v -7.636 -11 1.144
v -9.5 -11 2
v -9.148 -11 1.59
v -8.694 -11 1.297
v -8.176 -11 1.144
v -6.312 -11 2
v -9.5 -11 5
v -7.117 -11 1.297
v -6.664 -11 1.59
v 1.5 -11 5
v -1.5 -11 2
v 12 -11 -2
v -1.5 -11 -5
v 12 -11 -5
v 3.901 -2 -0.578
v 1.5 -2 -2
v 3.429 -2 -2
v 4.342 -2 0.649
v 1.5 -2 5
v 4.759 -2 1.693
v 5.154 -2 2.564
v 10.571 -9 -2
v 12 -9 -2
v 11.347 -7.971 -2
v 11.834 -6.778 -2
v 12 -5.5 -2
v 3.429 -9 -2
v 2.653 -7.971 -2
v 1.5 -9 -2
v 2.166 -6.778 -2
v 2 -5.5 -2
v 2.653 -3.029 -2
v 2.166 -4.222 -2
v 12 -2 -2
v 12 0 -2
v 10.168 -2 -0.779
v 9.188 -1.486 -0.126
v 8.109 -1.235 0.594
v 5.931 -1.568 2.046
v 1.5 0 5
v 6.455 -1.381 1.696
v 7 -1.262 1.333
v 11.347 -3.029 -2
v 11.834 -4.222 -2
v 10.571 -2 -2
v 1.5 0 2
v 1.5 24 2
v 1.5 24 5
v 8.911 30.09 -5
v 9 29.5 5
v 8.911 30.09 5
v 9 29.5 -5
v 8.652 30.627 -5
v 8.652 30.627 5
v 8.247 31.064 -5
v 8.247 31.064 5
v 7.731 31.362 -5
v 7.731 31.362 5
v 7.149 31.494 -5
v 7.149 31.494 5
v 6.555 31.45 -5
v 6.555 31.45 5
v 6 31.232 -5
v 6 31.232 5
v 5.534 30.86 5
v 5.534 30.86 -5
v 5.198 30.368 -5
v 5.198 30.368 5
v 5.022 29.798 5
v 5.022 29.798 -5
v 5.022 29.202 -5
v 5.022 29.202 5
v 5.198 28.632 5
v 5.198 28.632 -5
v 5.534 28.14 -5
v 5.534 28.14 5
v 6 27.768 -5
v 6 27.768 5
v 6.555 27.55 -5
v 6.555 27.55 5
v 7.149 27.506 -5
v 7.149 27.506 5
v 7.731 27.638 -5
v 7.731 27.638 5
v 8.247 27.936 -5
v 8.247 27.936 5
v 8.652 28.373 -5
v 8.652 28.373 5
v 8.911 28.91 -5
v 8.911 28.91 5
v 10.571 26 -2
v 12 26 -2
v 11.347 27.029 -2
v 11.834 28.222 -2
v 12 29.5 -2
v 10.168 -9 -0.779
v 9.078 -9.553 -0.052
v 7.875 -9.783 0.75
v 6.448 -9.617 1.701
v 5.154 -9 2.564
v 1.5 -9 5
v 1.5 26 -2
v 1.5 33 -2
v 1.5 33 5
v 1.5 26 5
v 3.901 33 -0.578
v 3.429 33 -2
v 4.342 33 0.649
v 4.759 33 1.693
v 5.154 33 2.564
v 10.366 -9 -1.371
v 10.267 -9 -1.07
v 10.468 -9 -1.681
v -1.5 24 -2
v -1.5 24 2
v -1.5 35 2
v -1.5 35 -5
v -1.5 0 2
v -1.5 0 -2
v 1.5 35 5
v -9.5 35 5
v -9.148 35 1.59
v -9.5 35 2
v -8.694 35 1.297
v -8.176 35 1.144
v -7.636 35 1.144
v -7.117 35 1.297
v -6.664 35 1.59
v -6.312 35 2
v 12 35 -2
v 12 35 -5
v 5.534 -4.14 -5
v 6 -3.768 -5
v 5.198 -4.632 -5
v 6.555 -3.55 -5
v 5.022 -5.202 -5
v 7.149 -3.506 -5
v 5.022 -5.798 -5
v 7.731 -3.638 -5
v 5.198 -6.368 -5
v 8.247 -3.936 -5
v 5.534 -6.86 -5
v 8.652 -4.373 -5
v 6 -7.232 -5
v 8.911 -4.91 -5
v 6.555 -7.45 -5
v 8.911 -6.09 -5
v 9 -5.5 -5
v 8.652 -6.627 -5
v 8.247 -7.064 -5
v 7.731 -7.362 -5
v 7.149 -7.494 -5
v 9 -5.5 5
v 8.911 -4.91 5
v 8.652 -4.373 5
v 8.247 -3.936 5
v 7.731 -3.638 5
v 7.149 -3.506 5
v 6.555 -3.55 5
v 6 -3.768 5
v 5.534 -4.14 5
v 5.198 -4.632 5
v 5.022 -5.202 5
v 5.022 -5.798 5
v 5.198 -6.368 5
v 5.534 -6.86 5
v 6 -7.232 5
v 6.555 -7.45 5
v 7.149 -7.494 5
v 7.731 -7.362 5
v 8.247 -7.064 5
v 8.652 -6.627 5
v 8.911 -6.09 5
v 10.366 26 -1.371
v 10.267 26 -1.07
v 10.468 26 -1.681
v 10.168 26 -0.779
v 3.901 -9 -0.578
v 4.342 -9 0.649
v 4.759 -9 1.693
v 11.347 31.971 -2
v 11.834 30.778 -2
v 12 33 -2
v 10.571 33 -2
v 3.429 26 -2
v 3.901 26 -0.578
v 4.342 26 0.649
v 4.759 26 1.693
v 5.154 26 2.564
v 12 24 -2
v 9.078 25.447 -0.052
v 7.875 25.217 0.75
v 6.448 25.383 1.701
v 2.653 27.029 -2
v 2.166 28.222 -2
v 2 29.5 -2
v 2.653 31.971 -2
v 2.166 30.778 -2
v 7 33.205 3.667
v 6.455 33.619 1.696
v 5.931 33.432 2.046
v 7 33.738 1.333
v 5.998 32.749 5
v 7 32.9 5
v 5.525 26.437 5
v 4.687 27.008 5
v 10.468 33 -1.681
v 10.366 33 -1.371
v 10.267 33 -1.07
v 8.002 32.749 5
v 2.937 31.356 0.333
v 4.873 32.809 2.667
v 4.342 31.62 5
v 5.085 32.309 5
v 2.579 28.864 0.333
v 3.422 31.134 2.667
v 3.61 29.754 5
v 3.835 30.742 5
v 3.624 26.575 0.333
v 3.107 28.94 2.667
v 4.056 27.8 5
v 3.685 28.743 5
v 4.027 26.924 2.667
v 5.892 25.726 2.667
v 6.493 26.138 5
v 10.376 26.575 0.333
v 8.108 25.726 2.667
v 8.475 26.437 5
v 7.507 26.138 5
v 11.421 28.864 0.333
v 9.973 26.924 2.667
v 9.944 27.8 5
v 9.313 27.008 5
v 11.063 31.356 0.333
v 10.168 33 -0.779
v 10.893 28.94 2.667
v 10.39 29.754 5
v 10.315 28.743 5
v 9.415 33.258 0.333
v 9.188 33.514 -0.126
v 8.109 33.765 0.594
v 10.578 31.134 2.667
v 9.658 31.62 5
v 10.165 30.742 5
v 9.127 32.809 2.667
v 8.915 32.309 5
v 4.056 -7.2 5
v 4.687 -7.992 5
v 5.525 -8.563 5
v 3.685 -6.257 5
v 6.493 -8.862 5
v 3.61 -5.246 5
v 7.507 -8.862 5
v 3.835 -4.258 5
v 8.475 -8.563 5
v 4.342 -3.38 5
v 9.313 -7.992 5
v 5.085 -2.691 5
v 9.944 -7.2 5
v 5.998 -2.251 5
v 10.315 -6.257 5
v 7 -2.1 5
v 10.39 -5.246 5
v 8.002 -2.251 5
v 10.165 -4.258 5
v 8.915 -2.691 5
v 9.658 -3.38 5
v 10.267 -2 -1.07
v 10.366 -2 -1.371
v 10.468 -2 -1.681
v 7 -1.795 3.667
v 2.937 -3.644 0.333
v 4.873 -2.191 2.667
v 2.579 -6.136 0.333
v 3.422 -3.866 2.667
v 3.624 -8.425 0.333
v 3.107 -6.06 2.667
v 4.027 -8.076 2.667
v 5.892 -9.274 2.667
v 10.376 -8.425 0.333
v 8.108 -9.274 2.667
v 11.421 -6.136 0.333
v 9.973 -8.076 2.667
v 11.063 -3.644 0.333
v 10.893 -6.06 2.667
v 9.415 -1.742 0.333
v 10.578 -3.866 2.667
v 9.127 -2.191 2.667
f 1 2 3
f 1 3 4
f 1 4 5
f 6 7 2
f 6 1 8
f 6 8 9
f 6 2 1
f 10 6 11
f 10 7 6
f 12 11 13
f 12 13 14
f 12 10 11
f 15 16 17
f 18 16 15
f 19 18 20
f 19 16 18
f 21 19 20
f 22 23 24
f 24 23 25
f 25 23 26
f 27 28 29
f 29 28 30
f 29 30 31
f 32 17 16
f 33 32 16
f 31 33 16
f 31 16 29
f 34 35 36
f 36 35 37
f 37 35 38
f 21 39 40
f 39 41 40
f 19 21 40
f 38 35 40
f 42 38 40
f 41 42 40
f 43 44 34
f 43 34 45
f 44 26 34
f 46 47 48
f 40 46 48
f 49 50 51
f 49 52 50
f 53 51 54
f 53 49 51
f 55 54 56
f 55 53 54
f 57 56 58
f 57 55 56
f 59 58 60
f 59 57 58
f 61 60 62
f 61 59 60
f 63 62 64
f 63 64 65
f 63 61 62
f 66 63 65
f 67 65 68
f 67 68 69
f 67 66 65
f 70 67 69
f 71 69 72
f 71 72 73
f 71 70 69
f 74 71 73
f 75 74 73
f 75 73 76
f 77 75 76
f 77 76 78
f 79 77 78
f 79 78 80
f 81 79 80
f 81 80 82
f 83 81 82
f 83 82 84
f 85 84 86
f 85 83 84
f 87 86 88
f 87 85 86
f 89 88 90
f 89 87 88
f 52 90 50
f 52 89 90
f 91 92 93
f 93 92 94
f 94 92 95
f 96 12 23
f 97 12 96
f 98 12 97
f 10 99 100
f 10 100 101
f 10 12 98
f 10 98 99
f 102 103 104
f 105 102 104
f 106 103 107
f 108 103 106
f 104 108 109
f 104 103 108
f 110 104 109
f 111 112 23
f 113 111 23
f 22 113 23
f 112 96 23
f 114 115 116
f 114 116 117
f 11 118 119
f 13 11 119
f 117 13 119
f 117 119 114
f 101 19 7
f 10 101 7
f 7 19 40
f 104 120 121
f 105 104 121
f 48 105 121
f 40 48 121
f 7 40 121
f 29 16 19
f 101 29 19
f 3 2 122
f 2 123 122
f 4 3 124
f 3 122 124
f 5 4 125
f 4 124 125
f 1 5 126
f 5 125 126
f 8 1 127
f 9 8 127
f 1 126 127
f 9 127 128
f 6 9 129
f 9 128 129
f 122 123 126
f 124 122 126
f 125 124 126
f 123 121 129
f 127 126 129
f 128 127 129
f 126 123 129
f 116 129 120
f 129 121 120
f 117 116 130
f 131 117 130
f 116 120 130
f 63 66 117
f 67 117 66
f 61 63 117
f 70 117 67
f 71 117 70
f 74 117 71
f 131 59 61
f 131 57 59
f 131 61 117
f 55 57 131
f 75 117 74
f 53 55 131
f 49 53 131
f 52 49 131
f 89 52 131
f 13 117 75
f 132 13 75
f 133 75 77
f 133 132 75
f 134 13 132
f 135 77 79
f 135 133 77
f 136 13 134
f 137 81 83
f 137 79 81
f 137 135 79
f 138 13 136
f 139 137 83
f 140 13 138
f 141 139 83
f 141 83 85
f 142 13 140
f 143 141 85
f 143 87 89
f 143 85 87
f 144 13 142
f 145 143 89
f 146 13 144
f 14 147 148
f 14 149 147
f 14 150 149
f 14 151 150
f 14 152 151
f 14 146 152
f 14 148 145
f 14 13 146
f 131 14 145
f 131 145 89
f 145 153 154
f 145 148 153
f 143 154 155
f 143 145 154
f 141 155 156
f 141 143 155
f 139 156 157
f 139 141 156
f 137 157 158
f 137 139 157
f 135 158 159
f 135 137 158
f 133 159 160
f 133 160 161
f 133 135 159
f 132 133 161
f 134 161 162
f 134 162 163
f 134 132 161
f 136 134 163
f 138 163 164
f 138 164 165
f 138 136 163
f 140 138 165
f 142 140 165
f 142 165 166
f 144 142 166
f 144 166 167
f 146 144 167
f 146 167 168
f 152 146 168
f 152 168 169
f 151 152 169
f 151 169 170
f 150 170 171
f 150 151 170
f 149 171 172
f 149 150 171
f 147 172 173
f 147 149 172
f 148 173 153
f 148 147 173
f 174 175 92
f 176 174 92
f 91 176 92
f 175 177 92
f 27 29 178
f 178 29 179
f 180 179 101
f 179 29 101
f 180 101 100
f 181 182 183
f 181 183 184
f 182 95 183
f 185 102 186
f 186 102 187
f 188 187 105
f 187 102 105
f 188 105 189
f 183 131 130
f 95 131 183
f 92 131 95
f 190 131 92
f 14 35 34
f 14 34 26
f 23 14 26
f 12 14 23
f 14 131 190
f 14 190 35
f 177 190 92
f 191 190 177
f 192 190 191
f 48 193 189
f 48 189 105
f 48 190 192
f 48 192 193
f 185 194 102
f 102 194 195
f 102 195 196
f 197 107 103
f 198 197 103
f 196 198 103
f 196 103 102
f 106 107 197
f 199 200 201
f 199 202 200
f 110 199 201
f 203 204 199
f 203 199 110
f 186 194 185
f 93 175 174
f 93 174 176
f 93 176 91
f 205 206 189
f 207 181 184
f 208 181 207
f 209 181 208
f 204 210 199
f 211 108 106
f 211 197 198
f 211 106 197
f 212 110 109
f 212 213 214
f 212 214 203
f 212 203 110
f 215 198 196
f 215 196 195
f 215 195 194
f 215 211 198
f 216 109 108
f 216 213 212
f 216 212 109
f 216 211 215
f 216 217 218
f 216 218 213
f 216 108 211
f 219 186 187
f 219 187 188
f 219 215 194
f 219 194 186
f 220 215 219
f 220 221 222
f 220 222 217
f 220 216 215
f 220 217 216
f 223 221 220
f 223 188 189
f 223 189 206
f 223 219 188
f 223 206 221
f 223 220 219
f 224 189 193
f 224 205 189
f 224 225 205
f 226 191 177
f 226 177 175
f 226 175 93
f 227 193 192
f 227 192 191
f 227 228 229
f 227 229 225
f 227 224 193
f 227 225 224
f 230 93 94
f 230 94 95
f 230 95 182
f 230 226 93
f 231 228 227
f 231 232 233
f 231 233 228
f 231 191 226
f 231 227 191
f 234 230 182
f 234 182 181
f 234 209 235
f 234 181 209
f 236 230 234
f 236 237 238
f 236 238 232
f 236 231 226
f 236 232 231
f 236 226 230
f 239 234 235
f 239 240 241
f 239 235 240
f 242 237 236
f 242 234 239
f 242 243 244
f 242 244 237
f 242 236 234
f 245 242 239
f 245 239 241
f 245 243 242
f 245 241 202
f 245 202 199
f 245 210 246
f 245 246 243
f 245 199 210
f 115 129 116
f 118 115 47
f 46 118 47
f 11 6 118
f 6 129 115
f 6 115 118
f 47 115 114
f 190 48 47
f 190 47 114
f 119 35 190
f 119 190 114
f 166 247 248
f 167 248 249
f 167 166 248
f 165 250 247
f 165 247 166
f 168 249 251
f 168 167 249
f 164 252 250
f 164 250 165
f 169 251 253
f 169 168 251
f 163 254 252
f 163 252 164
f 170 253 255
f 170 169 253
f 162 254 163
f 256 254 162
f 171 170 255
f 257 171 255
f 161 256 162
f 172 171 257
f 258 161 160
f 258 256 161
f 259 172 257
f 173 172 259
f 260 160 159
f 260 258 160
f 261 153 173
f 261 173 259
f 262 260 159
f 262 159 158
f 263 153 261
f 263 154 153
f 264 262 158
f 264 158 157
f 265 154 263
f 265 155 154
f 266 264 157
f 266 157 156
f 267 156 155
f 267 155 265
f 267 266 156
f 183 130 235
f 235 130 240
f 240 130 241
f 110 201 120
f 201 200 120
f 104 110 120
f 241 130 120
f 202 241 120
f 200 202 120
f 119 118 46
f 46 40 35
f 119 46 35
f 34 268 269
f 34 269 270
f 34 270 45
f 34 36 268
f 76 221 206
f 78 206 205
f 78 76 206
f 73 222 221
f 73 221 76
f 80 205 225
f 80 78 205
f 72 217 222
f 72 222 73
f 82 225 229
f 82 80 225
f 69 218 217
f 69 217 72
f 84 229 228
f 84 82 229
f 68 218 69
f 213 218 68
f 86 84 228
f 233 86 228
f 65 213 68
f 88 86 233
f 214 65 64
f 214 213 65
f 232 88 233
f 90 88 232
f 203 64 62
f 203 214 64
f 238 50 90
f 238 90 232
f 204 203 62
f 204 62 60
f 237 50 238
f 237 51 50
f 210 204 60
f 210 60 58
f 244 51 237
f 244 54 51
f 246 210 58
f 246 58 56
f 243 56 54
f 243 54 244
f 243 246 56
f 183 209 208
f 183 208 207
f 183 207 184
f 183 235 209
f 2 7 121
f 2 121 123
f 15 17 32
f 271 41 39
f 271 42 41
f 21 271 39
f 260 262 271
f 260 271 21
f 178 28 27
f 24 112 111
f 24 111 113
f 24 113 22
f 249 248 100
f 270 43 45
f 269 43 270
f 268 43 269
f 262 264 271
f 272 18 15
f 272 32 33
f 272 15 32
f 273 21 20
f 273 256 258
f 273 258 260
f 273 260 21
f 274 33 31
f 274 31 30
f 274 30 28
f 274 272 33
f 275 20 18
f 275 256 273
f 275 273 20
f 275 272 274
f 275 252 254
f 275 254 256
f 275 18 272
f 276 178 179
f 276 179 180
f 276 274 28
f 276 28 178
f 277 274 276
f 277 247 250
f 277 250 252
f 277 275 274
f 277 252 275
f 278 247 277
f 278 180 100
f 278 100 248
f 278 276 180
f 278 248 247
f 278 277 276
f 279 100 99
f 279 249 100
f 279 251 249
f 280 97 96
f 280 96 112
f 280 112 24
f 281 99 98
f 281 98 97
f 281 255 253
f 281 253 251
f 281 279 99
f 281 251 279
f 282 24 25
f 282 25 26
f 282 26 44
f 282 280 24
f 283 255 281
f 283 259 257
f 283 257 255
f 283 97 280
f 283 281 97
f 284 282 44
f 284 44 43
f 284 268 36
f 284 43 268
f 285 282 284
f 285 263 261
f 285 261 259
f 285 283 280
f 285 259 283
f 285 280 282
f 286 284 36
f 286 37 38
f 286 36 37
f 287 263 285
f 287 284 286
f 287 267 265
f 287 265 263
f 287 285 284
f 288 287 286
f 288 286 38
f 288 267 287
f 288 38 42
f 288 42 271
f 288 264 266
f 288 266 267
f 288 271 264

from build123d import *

# Parameters (mm, degrees)
F0_W      = 3
F0_H      = 4
F1_DEPTH  = 11
F2_DEPTH  = 2
F4_DEPTH  = 2
F5_R      = 2
F6_DEPTH  = 25
F7_R      = 3.4
F7_R_2    = 2
F8_DEPTH  = 7
F13_DEPTH = 24


with BuildPart() as f1:
    # F0 (on Front) → F1 (new body)
    with BuildSketch(Plane.XZ):
        Polygon((12, -5), (12, -2), (1.5, -2), (-1.5, -2), (-1.5, -4), (-1.5, -5), (1.5, -5), align=None)
        with BuildLine():
            Line((1.5, 4), (1.5, 5))
            Line((1.5, 5), (-9.5, 5))
            Line((-9.5, 5), (-9.5, 2))
            ThreePointArc((-9.5, 2), (-7.9057595357, 1.1241546177), (-6.3115190715, 2))
            Line((-6.3115190715, 2), (-1.5, 2))
            Line((-1.5, 2), (1.5, 2))
            Line((1.5, 2), (1.5, 4))
        make_face()
        Rectangle(F0_W, F0_H)
    extrude(amount=F1_DEPTH)

    # F0 (on Front) → F2 (join)
    with BuildSketch(Plane.XZ):
        Polygon((12, -2), (1.5, 5), (1.5, 4), (1.5, 2), (1.5, -2), align=None)
    extrude(amount=F2_DEPTH)

    # F3 (on face) → F4 (join)
    with BuildSketch(Plane.XZ.offset(11)):
        Polygon((1.5, -2), (12, -2), (1.5, 5), align=None)
    extrude(amount=-F4_DEPTH)

    # F5 (on face) → F6 (cut)
    with BuildSketch(Plane(origin=(0, 0, -5), x_dir=(1, 0, 0), z_dir=(0, 0, -1))):
        with Locations((7.0000002161, 5.5)):
            Circle(F5_R)
    extrude(amount=-F6_DEPTH, mode=Mode.SUBTRACT)

    # F7 (on face) → F8 (join)
    with BuildSketch(Plane.XY.offset(-2)):
        with Locations((7.0000002161, -5.5)):
            Circle(F7_R)
        with Locations((7.0000002161, -5.5)):
            Circle(F7_R_2, mode=Mode.SUBTRACT)
    extrude(amount=F8_DEPTH)

    # F10 (on offset) → F11 (revolve)
    with BuildSketch(Plane.YZ.offset(7)):
        Polygon((-2.1, 5), (-2.1, -2), (-2, -2), (-0.5000002161, -2), align=None)
    revolve(axis=Axis((7, -5.5, 1.7165149804), (0, 0, 1)))


with BuildPart() as f12_1:
    # F12: copy of F1
    add(f1.part.moved(Location((0, 35, 0))))


with BuildPart() as f1_1:
    add(f1.part)

    add(f12_1.part)  # F13 merges F12_1
    # F0 (on Front) → F13 (join)
    with BuildSketch(Plane.XZ):
        Polygon((12, -5), (12, -2), (1.5, -2), (-1.5, -2), (-1.5, -4), (-1.5, -5), (1.5, -5), align=None)
        with BuildLine():
            Line((1.5, 4), (1.5, 5))
            Line((1.5, 5), (-9.5, 5))
            Line((-9.5, 5), (-9.5, 2))
            ThreePointArc((-9.5, 2), (-7.9057595357, 1.1241546177), (-6.3115190715, 2))
            Line((-6.3115190715, 2), (-1.5, 2))
            Line((-1.5, 2), (1.5, 2))
            Line((1.5, 2), (1.5, 4))
        make_face()
    extrude(amount=-F13_DEPTH)


solid = f1_1.part
